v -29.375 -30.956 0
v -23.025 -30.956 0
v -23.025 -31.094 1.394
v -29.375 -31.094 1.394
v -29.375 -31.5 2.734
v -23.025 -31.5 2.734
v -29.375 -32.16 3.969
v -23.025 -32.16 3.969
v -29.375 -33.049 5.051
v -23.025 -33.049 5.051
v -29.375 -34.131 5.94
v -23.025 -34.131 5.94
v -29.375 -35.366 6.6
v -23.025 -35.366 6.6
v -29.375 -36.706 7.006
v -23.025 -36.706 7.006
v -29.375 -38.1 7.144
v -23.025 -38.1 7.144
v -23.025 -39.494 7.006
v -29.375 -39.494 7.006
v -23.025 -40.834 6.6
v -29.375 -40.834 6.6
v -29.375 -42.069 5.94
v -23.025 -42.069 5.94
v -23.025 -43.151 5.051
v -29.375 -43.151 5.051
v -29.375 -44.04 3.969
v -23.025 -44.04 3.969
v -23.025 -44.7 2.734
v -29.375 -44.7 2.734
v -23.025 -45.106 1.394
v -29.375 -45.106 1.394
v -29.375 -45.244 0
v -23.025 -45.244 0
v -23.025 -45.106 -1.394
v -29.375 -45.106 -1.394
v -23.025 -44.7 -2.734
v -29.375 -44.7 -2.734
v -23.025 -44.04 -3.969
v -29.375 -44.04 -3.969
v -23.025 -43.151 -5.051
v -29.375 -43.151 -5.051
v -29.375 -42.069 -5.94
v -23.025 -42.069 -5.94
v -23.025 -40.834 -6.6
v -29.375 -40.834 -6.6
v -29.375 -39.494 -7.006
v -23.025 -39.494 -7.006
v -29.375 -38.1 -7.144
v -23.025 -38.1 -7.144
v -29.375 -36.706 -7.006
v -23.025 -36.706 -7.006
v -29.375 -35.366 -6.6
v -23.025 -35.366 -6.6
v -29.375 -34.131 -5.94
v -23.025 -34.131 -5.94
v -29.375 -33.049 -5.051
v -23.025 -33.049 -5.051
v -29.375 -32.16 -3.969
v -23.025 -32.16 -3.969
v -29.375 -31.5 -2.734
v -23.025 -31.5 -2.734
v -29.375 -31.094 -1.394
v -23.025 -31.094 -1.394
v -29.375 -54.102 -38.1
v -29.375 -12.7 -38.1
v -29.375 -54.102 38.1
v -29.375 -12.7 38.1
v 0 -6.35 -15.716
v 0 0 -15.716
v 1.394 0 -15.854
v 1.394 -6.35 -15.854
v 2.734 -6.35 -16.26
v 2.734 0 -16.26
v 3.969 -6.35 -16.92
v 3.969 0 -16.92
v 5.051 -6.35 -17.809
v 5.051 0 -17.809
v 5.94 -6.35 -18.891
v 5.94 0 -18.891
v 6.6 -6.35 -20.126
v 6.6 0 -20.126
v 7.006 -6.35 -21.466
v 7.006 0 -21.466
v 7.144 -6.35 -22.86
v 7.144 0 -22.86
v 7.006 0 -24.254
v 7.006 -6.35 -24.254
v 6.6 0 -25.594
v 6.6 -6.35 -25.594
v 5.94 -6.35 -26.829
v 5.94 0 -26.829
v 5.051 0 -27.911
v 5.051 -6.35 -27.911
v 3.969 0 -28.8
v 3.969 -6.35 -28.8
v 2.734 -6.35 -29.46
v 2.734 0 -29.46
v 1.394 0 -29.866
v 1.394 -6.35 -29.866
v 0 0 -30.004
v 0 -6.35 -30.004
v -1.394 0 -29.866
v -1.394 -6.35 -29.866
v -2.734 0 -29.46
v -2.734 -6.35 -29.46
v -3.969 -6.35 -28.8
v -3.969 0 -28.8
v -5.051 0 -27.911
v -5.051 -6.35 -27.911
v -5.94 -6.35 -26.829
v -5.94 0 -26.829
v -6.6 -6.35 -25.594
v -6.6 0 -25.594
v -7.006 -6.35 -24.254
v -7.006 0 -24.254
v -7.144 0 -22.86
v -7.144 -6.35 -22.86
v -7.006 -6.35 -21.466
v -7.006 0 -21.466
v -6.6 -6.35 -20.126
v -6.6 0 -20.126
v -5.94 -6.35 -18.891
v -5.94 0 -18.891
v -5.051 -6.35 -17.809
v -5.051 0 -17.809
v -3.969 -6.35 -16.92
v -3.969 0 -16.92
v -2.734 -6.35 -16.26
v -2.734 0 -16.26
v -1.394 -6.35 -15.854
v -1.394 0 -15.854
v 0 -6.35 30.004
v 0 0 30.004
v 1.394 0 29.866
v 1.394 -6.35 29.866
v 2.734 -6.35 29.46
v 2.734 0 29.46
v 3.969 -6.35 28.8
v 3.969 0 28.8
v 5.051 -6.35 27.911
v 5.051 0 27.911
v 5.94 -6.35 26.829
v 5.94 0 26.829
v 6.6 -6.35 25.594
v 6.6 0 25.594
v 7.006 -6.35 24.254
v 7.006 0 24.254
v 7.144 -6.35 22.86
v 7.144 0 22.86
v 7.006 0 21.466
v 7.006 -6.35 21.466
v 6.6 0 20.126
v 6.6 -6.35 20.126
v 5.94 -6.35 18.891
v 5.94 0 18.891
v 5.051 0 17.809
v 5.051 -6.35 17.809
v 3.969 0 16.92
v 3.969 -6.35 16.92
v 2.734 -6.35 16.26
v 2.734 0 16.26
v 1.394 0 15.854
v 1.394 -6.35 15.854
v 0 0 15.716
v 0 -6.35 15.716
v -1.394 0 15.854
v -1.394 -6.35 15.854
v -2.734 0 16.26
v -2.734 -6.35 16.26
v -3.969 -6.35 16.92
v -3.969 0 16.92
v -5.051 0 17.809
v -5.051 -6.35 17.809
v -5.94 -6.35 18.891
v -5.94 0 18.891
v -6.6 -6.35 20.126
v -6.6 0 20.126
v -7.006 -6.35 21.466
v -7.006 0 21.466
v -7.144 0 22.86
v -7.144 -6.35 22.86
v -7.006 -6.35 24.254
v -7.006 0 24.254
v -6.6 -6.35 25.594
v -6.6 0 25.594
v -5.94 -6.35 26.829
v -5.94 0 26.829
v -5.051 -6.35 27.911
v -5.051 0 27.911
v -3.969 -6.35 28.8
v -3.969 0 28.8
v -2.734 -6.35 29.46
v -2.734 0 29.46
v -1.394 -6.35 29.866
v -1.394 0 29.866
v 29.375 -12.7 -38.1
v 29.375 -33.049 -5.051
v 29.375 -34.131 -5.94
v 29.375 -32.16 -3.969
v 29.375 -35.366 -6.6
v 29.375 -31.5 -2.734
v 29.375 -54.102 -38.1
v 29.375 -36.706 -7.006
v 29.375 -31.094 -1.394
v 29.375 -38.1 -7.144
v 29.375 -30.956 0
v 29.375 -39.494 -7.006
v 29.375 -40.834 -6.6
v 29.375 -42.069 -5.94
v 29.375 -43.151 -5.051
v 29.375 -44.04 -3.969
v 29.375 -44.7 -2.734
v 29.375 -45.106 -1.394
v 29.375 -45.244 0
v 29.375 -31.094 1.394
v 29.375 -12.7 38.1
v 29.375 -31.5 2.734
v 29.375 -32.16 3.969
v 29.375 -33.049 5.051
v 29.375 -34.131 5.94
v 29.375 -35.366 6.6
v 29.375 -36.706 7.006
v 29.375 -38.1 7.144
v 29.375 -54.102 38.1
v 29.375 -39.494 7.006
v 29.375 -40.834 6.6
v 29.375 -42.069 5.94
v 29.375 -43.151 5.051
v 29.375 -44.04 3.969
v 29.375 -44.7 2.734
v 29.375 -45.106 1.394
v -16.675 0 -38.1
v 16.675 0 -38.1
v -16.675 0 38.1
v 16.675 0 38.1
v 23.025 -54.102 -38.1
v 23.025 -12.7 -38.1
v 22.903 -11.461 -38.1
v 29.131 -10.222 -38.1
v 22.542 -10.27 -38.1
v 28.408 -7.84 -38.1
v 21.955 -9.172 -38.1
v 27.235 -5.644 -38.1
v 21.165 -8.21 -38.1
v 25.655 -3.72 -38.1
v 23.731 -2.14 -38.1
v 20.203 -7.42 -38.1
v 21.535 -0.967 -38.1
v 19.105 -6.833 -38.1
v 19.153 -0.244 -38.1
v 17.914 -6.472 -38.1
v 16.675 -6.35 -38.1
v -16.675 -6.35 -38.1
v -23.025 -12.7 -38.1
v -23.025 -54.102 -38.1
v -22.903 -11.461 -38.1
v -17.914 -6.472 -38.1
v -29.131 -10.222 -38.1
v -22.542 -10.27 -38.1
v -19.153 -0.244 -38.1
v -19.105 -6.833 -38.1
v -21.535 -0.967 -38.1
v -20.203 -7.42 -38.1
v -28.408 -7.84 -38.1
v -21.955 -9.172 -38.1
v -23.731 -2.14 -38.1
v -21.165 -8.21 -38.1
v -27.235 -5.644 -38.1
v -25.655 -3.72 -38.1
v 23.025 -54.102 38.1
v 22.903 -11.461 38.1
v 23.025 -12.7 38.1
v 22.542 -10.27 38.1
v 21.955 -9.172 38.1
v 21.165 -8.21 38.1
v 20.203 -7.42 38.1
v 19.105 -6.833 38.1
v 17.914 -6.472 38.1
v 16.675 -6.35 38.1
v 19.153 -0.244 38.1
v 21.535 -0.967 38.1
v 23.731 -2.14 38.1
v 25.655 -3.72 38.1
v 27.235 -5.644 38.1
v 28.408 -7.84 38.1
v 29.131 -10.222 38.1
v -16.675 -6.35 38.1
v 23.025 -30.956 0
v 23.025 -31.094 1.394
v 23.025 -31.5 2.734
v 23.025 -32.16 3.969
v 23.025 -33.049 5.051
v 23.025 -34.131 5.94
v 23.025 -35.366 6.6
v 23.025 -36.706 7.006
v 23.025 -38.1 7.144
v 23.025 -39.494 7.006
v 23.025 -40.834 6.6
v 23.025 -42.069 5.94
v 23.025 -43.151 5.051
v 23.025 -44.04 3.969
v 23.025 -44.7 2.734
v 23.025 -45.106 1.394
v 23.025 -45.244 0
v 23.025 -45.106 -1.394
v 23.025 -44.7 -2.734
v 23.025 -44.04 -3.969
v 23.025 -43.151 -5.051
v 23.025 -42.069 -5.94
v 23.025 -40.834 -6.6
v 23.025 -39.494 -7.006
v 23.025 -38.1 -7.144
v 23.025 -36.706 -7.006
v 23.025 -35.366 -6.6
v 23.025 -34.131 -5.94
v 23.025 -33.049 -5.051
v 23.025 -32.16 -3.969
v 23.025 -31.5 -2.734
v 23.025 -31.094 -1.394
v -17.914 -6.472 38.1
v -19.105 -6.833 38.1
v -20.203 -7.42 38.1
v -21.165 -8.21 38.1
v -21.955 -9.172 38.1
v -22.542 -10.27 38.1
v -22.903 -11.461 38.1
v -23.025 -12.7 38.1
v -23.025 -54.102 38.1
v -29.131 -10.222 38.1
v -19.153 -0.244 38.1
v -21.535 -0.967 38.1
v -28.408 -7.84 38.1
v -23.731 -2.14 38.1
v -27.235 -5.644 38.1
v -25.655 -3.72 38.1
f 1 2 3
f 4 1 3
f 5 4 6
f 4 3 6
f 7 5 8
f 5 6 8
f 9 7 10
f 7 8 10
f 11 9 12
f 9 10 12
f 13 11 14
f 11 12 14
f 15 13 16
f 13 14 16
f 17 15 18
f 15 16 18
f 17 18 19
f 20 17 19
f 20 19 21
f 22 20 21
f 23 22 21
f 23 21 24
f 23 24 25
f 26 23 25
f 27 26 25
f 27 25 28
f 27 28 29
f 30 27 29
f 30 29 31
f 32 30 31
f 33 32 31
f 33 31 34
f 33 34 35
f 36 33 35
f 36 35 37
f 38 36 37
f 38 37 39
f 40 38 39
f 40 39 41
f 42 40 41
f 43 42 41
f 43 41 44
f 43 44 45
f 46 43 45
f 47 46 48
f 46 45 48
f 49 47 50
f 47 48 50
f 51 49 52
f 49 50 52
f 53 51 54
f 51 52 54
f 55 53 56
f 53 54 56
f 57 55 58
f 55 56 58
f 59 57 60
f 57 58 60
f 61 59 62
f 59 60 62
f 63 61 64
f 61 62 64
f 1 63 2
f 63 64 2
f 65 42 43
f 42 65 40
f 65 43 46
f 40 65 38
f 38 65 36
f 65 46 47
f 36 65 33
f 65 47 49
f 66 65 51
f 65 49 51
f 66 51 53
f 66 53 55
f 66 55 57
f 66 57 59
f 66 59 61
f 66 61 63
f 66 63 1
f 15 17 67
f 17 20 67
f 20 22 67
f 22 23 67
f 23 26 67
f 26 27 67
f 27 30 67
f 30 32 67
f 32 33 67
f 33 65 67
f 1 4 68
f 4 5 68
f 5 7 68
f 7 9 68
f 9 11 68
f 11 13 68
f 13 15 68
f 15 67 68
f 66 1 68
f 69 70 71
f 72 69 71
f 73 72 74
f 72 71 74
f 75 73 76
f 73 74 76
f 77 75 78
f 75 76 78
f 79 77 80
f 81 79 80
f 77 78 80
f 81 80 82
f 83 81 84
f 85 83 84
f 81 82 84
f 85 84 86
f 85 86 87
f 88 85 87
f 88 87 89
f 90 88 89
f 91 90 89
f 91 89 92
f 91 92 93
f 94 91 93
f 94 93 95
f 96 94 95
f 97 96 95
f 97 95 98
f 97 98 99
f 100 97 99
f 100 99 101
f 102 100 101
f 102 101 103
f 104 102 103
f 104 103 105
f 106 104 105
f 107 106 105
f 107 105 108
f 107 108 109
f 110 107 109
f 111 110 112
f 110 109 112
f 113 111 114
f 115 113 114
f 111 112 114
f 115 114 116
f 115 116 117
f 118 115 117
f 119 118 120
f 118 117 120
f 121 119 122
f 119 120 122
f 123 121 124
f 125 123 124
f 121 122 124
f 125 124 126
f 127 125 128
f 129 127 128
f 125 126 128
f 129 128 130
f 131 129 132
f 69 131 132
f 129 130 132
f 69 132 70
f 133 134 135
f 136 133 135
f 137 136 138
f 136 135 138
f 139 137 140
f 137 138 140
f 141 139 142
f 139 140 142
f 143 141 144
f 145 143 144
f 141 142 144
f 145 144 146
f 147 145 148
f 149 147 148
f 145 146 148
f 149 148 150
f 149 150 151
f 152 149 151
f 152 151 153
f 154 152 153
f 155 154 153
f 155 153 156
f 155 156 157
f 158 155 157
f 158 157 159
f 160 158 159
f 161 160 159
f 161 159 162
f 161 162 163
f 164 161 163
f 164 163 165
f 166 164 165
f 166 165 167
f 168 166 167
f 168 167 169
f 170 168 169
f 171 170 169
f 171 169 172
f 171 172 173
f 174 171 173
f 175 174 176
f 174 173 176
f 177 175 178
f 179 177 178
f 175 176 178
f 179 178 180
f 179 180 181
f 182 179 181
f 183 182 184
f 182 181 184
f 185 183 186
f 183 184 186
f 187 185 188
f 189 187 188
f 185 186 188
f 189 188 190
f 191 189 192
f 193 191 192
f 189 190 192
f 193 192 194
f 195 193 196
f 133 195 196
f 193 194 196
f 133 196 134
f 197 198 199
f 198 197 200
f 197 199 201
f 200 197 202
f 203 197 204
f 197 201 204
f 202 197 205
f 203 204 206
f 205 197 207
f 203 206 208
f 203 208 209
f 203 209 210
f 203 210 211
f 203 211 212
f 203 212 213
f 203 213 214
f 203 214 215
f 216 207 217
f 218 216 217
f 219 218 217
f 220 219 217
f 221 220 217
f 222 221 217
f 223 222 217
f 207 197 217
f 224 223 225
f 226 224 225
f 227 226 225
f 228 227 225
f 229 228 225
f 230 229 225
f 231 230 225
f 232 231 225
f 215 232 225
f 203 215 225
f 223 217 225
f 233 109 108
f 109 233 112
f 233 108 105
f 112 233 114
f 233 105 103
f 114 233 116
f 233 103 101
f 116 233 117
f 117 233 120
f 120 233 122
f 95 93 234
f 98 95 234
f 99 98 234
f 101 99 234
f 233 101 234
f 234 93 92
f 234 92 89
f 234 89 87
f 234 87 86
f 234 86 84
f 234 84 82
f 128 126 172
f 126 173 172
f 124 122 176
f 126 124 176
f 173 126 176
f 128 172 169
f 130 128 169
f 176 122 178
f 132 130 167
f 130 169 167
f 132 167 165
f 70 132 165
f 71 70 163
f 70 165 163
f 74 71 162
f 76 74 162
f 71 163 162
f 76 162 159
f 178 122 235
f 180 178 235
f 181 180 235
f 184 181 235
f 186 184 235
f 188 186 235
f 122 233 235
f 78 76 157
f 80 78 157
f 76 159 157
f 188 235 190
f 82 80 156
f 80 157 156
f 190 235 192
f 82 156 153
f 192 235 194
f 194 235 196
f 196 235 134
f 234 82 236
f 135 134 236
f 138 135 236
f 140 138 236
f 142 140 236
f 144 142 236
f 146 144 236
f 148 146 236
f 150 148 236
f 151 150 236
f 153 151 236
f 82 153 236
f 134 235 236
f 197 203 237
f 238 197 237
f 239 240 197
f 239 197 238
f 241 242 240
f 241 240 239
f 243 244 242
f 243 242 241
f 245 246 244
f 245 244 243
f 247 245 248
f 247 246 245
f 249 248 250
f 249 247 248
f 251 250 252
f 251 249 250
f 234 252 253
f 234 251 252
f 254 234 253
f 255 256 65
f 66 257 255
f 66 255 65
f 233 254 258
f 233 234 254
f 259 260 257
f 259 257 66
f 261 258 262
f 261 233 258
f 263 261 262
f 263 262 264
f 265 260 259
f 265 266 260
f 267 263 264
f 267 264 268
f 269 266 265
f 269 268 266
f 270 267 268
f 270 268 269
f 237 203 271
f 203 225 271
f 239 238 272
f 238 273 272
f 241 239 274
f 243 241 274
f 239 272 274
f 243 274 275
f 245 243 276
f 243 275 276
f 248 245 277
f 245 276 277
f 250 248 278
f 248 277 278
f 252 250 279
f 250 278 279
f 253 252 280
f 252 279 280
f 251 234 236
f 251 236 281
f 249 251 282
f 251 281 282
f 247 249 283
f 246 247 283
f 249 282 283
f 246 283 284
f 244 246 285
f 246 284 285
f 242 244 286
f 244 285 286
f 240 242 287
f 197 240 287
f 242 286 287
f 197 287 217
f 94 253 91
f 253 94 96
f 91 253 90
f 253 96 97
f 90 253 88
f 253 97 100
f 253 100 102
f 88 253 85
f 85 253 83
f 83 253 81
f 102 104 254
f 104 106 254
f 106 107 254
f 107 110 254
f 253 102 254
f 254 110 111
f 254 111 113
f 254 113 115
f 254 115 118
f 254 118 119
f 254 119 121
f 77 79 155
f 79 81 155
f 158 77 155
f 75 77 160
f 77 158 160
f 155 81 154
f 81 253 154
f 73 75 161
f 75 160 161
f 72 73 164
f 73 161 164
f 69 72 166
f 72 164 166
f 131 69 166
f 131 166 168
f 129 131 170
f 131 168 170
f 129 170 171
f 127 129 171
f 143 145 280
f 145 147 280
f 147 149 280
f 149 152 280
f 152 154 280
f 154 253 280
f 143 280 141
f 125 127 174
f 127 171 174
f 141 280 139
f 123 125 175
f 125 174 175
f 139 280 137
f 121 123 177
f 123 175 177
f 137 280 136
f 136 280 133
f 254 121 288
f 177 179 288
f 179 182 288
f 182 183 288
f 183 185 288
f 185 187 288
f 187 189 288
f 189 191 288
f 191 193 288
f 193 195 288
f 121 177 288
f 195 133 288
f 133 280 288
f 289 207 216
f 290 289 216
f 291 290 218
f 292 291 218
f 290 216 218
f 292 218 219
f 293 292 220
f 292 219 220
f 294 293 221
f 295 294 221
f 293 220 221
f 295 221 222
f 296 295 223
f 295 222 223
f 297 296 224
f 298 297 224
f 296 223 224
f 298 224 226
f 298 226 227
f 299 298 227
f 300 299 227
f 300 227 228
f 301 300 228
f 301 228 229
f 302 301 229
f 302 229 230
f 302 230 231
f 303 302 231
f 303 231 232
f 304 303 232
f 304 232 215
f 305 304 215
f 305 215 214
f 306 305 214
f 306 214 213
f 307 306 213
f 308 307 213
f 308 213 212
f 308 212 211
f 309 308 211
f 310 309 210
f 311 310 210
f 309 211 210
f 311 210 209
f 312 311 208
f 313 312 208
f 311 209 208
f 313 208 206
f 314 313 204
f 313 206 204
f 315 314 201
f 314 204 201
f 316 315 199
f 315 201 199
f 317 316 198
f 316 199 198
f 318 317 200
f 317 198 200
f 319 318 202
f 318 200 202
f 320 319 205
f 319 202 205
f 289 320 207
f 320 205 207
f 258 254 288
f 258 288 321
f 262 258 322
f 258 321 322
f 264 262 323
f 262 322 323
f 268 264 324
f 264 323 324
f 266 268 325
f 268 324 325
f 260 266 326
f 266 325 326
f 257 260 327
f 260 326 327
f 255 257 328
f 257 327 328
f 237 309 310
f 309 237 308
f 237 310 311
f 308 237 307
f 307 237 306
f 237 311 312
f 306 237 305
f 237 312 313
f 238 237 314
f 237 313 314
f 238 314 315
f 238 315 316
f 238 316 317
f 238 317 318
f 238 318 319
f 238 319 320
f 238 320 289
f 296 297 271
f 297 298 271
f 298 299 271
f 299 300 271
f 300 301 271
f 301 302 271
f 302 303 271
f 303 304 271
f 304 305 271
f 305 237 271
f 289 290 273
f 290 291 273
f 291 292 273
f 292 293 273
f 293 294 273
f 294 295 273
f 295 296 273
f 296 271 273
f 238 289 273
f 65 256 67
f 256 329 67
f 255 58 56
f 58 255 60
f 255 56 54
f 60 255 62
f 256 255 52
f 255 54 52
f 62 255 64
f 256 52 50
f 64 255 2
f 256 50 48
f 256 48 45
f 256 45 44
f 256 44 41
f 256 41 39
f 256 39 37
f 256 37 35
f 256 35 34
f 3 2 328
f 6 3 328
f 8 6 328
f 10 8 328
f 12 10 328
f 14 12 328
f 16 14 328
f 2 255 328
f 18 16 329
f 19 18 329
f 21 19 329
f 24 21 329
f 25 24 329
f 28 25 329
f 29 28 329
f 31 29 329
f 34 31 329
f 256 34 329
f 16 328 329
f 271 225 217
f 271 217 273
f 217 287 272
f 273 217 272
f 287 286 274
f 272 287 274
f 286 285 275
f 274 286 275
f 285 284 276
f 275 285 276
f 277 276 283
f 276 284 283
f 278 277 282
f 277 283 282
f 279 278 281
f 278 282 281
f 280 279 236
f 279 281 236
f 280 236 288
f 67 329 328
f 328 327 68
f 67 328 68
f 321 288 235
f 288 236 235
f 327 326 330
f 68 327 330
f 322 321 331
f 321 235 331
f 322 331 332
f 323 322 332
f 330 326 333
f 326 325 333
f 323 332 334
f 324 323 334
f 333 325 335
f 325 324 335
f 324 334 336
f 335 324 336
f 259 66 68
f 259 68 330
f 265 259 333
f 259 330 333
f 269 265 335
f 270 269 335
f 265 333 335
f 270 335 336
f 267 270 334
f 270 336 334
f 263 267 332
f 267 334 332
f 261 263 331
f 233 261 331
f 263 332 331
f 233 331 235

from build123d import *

# Parameters (mm, degrees)
BOSS_EXTRUDE1_DEPTH = 38.1
SKETCH2_R           = 7.14375
CUT_EXTRUDE1_DEPTH  = 89.488543914
SKETCH3_R           = 7.14375
CUT_EXTRUDE2_DEPTH  = 73.398431641


with BuildPart() as part:
    # Sketch1 → Boss-Extrude1 (new, symmetric)
    with BuildSketch(Plane.XY):
        with BuildLine():
            Line((-23.0251, -12.7), (-23.0251, -54.102))
            Line((-23.0251, -54.102), (-29.3751, -54.102))
            Line((-29.3751, -54.102), (-29.3751, -12.7))
            ThreePointArc((-29.3751, -12.7), (-25.655356121, -3.719743879), (-16.6751, 0))
            Line((-16.6751, 0), (16.6751, 0))
            ThreePointArc((16.6751, 0), (25.655356121, -3.719743879), (29.3751, -12.7))
            Line((29.3751, -12.7), (29.3751, -54.102))
            Line((29.3751, -54.102), (23.0251, -54.102))
            Line((23.0251, -54.102), (23.0251, -12.7))
            ThreePointArc((23.0251, -12.7), (21.165228061, -8.209871939), (16.6751, -6.35))
            Line((16.6751, -6.35), (-16.6751, -6.35))
            ThreePointArc((-16.6751, -6.35), (-21.165228061, -8.209871939), (-23.0251, -12.7))
        make_face()
    extrude(amount=BOSS_EXTRUDE1_DEPTH, both=True)

    # Sketch2 → Cut-Extrude1 (cut, through all)
    with BuildSketch(Plane(origin=(29.3751, 0, 0), x_dir=(0, 0, -1), z_dir=(1, 0, 0))):
        with Locations(Location((0, -38.1, 0), (0, 0, 90))):
            Circle(SKETCH2_R)
    extrude(amount=-CUT_EXTRUDE1_DEPTH, mode=Mode.SUBTRACT)

    # Sketch3 → Cut-Extrude2 (cut, through all)
    with BuildSketch(Plane(origin=(0, 0, 0), x_dir=(1, 0, 0), z_dir=(0, 1, 0))):
        with Locations(Location((0, 22.86, 0), (0, 0, 270))):
            Circle(SKETCH3_R)
        with Locations(Location((0, -22.86, 0), (0, 0, 270))):
            Circle(SKETCH3_R)
    extrude(amount=-CUT_EXTRUDE2_DEPTH, mode=Mode.SUBTRACT)


solid = part.part
